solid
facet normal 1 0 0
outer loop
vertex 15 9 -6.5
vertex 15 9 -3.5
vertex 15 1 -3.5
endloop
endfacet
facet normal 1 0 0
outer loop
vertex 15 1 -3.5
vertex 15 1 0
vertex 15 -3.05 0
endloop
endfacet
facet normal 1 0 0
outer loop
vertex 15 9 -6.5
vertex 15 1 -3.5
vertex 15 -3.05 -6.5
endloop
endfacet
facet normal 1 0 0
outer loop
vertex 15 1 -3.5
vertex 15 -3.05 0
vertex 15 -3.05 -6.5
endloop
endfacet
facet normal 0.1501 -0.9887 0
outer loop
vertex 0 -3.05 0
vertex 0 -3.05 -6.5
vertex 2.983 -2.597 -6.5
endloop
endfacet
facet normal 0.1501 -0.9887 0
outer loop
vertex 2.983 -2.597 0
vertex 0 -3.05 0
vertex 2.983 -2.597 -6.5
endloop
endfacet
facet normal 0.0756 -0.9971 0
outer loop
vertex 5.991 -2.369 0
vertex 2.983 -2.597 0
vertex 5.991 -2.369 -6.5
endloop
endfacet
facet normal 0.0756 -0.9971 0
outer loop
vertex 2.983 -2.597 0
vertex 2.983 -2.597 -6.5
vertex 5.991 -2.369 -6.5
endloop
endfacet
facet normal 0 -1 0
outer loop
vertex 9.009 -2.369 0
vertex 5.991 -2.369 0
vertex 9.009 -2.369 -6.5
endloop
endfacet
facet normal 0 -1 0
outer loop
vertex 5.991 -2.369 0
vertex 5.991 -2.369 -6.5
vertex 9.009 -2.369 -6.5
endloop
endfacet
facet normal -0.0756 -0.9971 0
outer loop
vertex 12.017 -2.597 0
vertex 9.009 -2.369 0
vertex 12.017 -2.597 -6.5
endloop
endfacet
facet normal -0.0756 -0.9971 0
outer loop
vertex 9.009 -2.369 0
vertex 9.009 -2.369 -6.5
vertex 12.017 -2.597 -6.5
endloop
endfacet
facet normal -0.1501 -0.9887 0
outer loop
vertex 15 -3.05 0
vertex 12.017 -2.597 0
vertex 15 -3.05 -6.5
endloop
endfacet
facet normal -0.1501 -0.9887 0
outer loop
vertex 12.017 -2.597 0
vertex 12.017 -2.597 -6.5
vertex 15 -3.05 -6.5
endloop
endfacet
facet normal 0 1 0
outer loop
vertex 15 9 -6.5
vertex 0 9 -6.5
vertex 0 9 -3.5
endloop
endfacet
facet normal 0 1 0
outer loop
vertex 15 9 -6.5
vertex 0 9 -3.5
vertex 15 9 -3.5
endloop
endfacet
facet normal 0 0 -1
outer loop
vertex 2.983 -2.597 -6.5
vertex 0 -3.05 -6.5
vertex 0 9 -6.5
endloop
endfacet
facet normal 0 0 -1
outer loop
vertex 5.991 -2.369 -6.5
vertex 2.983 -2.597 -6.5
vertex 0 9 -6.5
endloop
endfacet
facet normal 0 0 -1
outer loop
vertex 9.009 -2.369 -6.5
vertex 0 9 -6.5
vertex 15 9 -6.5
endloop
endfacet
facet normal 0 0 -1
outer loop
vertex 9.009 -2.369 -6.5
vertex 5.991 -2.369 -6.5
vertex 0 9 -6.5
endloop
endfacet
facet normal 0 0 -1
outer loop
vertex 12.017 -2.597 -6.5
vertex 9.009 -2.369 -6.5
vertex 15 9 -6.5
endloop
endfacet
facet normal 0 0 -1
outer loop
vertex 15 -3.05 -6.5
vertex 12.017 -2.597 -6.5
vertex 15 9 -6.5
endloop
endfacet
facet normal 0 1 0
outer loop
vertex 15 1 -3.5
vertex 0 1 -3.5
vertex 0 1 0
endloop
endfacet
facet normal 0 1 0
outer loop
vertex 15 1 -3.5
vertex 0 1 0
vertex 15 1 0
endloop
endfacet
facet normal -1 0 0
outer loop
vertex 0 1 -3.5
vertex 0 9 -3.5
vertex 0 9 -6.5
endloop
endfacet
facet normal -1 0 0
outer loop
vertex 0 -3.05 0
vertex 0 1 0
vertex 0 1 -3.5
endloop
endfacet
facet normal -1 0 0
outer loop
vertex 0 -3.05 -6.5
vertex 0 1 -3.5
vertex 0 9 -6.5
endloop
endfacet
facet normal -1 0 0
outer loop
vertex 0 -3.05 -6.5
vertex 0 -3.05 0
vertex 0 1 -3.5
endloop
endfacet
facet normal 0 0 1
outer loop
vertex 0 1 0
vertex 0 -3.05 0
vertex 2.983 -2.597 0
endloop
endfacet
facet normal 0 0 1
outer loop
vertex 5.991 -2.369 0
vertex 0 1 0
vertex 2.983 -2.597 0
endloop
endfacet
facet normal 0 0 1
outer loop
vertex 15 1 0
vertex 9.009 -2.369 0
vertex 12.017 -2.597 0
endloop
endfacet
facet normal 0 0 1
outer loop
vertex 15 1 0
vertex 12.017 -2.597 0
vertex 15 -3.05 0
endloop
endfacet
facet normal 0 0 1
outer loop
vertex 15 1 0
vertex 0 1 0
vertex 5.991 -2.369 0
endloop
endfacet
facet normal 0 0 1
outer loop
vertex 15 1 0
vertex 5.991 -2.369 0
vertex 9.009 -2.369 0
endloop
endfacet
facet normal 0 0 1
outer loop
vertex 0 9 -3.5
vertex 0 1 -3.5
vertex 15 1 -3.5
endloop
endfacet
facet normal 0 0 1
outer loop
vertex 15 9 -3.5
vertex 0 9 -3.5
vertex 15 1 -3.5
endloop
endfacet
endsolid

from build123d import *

# Parameters (mm, degrees)
SKETCH1_W           = 15
SKETCH1_H           = 6.5
BOSS_EXTRUDE1_DEPTH = 1
BOSS_EXTRUDE2_START = -6.5
BOSS_EXTRUDE2_DEPTH = 6.5
SKETCH3_W           = 15
SKETCH3_H           = 3
BOSS_EXTRUDE3_DEPTH = 8


with BuildPart() as part:
    # Sketch1 → Boss-Extrude1 (new body)
    with BuildSketch(Plane(origin=(0, 0, 0), x_dir=(1, 0, 0), z_dir=(0, 1, 0))):
        with Locations((7.5, 3.25)):
            Rectangle(SKETCH1_W, SKETCH1_H)
    extrude(amount=BOSS_EXTRUDE1_DEPTH)

    # Sketch2 → Boss-Extrude2 (add)
    with BuildSketch(Plane.XY.offset(BOSS_EXTRUDE2_START)):
        with BuildLine():
            Line((0, 0), (0, -3.050294479))
            ThreePointArc((0, -3.050294479), (7.5, -2.340878593), (15, -3.050294479))
            Line((15, -3.050294479), (15, 0))
            ThreePointArc((15, 0), (7.5, 0.659121407), (0, 0))
        make_face()
    extrude(amount=BOSS_EXTRUDE2_DEPTH)

    # Sketch3 → Boss-Extrude3 (add)
    with BuildSketch(Plane(origin=(0, 1, 0), x_dir=(1, 0, 0), z_dir=(0, 1, 0))):
        with Locations((7.5, 5)):
            Rectangle(SKETCH3_W, SKETCH3_H)
    extrude(amount=BOSS_EXTRUDE3_DEPTH)


solid = part.part
